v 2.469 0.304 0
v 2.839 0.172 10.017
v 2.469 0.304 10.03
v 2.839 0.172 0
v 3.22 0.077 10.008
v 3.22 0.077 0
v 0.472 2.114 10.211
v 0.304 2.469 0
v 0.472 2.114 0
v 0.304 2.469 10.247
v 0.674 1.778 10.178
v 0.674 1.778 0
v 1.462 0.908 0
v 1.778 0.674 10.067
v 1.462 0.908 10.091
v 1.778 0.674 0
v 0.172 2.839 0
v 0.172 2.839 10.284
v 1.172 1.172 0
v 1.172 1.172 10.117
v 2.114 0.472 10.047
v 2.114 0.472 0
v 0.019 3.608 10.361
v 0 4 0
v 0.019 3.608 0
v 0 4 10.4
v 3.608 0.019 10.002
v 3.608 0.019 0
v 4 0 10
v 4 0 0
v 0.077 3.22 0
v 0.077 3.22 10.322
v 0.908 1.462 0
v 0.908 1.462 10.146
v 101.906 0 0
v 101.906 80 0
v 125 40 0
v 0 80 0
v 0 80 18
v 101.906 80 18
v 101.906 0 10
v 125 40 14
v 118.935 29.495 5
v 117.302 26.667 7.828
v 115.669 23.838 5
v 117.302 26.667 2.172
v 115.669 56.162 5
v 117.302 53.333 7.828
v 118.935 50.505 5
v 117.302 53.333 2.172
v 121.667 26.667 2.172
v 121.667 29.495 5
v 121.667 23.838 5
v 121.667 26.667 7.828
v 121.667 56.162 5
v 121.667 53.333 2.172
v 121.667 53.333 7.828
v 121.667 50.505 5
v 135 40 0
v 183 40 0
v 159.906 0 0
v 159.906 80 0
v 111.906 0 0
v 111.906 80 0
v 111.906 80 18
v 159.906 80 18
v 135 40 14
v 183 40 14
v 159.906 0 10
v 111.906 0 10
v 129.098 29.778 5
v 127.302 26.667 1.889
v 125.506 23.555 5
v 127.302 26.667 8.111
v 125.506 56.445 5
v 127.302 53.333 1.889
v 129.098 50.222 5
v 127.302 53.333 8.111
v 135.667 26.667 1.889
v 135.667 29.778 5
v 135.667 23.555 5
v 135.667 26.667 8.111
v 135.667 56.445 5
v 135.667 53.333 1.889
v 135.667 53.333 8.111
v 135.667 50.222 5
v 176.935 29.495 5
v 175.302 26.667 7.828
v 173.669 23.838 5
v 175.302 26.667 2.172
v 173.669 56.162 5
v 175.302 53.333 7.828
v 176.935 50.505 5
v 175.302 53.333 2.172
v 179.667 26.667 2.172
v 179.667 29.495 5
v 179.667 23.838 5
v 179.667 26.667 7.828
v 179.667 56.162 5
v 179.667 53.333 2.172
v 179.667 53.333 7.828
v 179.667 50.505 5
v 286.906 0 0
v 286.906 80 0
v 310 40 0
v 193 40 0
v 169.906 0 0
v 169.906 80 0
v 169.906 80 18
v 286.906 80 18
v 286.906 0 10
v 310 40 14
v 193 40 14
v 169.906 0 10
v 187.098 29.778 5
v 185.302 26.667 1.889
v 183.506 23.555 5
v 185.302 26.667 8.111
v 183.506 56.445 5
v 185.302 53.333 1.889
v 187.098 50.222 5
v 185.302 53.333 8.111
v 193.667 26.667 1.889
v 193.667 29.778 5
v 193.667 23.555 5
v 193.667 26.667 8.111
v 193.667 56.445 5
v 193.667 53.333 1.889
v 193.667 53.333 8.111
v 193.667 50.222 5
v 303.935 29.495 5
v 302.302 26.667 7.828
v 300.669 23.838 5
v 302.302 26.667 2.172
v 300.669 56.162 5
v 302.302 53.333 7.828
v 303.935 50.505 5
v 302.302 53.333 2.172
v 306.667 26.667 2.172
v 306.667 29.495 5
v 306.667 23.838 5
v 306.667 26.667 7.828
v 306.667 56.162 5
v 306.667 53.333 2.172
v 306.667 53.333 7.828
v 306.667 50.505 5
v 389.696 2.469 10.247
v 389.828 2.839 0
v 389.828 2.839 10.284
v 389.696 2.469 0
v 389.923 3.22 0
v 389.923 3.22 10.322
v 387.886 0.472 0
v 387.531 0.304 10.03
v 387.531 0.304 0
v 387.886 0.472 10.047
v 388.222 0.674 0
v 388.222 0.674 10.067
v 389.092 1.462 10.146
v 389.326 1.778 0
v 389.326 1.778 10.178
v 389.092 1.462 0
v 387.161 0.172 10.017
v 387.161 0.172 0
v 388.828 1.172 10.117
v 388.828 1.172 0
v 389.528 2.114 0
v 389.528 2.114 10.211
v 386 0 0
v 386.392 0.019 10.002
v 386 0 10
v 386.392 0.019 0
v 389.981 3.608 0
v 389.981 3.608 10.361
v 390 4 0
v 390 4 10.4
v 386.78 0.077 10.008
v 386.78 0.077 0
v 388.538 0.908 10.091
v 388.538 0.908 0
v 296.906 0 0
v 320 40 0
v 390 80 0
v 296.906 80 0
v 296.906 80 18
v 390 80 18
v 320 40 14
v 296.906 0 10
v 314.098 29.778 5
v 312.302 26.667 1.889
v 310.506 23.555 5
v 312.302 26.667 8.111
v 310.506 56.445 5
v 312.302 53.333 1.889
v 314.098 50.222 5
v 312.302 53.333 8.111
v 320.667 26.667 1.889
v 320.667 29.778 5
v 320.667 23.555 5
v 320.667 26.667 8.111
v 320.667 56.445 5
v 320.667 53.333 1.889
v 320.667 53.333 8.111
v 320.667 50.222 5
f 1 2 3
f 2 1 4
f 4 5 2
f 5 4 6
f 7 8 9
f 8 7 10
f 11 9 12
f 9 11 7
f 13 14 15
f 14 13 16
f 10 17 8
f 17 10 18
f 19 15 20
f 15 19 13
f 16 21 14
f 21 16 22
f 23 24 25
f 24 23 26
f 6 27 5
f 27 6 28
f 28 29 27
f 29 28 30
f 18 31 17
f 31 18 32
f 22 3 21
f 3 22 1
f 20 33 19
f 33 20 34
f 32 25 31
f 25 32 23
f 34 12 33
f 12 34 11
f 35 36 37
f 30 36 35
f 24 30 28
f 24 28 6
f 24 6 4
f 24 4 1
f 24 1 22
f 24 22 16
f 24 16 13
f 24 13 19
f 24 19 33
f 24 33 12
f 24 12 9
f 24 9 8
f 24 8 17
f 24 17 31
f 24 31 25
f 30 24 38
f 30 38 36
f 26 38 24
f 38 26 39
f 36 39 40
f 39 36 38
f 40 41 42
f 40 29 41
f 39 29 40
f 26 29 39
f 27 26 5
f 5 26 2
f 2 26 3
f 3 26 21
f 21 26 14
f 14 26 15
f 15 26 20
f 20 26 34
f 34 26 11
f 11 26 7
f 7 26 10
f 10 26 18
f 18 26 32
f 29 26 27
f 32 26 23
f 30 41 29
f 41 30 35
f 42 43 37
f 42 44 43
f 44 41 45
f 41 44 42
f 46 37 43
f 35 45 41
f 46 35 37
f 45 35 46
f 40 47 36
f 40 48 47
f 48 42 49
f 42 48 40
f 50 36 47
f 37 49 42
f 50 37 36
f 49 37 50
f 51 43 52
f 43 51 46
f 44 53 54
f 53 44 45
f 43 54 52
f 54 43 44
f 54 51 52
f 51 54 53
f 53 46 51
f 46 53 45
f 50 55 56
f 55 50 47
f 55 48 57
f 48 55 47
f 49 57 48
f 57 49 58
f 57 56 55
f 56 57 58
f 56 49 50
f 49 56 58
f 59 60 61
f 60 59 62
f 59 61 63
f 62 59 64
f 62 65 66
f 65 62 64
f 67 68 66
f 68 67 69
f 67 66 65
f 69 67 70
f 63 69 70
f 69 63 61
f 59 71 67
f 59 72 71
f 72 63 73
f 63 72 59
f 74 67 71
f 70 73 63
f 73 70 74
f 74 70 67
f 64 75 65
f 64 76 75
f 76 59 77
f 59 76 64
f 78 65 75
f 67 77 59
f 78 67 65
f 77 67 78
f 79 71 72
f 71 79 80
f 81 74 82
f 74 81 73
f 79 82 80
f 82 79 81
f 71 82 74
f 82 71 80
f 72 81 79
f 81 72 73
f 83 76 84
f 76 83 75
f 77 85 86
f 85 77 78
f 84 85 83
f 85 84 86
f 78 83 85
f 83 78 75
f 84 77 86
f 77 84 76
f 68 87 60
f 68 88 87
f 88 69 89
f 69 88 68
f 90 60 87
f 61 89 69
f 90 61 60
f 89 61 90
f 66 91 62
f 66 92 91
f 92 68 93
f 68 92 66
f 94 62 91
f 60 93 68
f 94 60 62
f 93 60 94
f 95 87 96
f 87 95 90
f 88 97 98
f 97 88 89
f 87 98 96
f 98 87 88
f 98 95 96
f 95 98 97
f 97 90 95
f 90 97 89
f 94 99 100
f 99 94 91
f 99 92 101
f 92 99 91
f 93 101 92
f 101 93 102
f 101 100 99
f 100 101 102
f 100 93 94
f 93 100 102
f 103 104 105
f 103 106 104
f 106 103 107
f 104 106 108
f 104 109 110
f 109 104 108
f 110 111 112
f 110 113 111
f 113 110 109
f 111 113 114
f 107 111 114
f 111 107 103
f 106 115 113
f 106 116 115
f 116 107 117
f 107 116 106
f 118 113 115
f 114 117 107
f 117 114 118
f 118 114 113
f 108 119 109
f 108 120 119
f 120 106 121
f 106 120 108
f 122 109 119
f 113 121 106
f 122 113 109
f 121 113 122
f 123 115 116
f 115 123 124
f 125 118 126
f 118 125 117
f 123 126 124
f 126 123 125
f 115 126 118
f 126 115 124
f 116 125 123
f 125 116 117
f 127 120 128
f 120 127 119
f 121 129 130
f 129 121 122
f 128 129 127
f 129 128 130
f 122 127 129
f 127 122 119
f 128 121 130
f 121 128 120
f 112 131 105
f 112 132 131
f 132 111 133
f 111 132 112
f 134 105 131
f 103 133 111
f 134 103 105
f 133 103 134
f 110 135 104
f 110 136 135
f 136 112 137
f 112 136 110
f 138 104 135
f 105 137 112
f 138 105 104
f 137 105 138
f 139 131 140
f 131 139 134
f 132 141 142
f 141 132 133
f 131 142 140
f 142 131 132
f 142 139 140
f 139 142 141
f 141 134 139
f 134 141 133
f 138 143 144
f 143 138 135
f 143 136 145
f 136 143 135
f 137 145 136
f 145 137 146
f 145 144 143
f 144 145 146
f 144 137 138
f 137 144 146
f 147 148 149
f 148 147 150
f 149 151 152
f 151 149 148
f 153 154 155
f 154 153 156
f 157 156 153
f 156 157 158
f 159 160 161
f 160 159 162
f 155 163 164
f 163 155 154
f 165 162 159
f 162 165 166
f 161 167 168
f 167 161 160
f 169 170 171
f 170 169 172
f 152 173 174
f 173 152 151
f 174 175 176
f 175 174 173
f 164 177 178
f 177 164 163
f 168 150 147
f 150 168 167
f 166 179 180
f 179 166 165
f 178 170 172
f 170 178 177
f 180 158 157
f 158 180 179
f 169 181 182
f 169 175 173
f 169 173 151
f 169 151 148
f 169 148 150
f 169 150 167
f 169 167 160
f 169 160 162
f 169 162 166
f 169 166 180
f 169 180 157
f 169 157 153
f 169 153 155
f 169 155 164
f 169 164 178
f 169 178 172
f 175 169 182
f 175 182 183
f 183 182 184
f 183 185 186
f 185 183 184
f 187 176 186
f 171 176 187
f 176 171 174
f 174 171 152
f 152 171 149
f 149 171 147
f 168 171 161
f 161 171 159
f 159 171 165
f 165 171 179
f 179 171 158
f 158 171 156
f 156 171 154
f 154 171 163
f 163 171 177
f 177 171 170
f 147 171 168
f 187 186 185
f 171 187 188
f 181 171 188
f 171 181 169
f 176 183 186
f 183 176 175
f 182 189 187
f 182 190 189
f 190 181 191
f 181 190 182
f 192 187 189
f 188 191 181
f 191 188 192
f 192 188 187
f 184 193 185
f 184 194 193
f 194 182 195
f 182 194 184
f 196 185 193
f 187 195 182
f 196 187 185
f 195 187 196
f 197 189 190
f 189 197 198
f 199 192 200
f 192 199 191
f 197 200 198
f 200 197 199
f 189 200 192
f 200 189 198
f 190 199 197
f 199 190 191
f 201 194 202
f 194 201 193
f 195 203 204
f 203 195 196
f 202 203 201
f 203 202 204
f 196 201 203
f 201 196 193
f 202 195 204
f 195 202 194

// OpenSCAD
/*
A (Parametric) Keyboard Wrist Rest
with a Chevron Design
by Mike Kasberg

Default size optimized for WASD tenkeyless keyboards.

Tip: Print upside down for a smooth top and slightly rough/grippy bottom!
*/

// COMMON LENGTHS:
// 61-key      290
// Tenkeyless  360
// Full        440


// The height of the front of the wrist rest.
front_height =10;
// The height of the back of the wrist rest. Typically slightly larger than front height.
back_height = 18;
// The depth (front to back) of the wrist rest.
depth = 80;
// The length of the wrist rest in the longest direction.
length = 360;

// Radius of the rounded front corners.
corner_radius = 4;

// How far from the left to inset the design.
design_inset = 125;

// Extra cut on the right sie for smaller printers. 0 for none.
extra_cut_inset = 290;

// Depth tolerance for connecting pins.
pin_depth_tolerance = 4;

// Size tolerance for connecting pins.
pin_size_tolerance = 0.4;

module base_shape() {
  translate([length, depth, 0]) rotate([0, 0, -90]) rotate([90, 0, 0]) {
    linear_extrude(height = length) {
      polygon([[0, 0], [depth, 0], [depth, front_height], [0, back_height]]);
    }
  }
}

module corner_cut() {
  difference() {
    translate([0, 0, (back_height / 2)])
      cube([2 * corner_radius, 2 * corner_radius, back_height + 2], center = true);
    translate([corner_radius, corner_radius, -1.1])
      cylinder(h = back_height + 2.2, r = corner_radius, $fn=64);
  }
}

module wrist_rest() {
  difference() {
    base_shape();
    corner_cut();
    translate([length, 0, 0]) rotate([0, 0, 90]) corner_cut();
  }
}

module pin(is_male=true) {
  if (is_male) {
    rotate([45, 0, 0]) cube([20, 4, 4]);
  } else {
    rotate([45, 0, 0])
      translate([0, -pin_size_tolerance / 2, -pin_size_tolerance / 2])
      cube([20, 4 + pin_size_tolerance, 4 + pin_size_tolerance]);
  }
}

module cutter(is_male = true) {
  translate([-300, depth/2, -1]) cylinder(h=back_height + 2, r = 300, $fn=6);
  
  tolerance = is_male ? 0 : pin_depth_tolerance;
  translate([-10 - depth/6 + tolerance, depth / 3, (front_height - 4/cos(45))/2])
    pin(is_male);
 
  translate([-10 - depth/6 + tolerance, 2 * depth / 3, (front_height - 4/cos(45))/2])
    pin(is_male);
}


intersection() {
  wrist_rest();
  translate([design_inset, 0, 0]) cutter(true);
}

translate([10, 0, 0]) intersection() {
  difference() {
    wrist_rest();
    translate([design_inset, 0, 0]) cutter(false);
  }
  translate([design_inset + 0.6 * depth, 0, 0]) cutter(true);
}

if (extra_cut_inset > 0) {
  translate([20, 0, 0]) intersection() {
    difference() {
      wrist_rest();
      translate([design_inset + 0.6 * depth, 0, 0]) cutter(false);
    }
    translate([extra_cut_inset, 0, 0]) cutter(true);
  }

  translate([30, 0, 0]) difference() {
    wrist_rest();
    translate([extra_cut_inset, 0, 0]) cutter(false);
  }
} else {
  translate([20, 0, 0]) difference() {
    wrist_rest();
    translate([design_inset + 0.6 * depth, 0, 0]) cutter(false);
  }
}
